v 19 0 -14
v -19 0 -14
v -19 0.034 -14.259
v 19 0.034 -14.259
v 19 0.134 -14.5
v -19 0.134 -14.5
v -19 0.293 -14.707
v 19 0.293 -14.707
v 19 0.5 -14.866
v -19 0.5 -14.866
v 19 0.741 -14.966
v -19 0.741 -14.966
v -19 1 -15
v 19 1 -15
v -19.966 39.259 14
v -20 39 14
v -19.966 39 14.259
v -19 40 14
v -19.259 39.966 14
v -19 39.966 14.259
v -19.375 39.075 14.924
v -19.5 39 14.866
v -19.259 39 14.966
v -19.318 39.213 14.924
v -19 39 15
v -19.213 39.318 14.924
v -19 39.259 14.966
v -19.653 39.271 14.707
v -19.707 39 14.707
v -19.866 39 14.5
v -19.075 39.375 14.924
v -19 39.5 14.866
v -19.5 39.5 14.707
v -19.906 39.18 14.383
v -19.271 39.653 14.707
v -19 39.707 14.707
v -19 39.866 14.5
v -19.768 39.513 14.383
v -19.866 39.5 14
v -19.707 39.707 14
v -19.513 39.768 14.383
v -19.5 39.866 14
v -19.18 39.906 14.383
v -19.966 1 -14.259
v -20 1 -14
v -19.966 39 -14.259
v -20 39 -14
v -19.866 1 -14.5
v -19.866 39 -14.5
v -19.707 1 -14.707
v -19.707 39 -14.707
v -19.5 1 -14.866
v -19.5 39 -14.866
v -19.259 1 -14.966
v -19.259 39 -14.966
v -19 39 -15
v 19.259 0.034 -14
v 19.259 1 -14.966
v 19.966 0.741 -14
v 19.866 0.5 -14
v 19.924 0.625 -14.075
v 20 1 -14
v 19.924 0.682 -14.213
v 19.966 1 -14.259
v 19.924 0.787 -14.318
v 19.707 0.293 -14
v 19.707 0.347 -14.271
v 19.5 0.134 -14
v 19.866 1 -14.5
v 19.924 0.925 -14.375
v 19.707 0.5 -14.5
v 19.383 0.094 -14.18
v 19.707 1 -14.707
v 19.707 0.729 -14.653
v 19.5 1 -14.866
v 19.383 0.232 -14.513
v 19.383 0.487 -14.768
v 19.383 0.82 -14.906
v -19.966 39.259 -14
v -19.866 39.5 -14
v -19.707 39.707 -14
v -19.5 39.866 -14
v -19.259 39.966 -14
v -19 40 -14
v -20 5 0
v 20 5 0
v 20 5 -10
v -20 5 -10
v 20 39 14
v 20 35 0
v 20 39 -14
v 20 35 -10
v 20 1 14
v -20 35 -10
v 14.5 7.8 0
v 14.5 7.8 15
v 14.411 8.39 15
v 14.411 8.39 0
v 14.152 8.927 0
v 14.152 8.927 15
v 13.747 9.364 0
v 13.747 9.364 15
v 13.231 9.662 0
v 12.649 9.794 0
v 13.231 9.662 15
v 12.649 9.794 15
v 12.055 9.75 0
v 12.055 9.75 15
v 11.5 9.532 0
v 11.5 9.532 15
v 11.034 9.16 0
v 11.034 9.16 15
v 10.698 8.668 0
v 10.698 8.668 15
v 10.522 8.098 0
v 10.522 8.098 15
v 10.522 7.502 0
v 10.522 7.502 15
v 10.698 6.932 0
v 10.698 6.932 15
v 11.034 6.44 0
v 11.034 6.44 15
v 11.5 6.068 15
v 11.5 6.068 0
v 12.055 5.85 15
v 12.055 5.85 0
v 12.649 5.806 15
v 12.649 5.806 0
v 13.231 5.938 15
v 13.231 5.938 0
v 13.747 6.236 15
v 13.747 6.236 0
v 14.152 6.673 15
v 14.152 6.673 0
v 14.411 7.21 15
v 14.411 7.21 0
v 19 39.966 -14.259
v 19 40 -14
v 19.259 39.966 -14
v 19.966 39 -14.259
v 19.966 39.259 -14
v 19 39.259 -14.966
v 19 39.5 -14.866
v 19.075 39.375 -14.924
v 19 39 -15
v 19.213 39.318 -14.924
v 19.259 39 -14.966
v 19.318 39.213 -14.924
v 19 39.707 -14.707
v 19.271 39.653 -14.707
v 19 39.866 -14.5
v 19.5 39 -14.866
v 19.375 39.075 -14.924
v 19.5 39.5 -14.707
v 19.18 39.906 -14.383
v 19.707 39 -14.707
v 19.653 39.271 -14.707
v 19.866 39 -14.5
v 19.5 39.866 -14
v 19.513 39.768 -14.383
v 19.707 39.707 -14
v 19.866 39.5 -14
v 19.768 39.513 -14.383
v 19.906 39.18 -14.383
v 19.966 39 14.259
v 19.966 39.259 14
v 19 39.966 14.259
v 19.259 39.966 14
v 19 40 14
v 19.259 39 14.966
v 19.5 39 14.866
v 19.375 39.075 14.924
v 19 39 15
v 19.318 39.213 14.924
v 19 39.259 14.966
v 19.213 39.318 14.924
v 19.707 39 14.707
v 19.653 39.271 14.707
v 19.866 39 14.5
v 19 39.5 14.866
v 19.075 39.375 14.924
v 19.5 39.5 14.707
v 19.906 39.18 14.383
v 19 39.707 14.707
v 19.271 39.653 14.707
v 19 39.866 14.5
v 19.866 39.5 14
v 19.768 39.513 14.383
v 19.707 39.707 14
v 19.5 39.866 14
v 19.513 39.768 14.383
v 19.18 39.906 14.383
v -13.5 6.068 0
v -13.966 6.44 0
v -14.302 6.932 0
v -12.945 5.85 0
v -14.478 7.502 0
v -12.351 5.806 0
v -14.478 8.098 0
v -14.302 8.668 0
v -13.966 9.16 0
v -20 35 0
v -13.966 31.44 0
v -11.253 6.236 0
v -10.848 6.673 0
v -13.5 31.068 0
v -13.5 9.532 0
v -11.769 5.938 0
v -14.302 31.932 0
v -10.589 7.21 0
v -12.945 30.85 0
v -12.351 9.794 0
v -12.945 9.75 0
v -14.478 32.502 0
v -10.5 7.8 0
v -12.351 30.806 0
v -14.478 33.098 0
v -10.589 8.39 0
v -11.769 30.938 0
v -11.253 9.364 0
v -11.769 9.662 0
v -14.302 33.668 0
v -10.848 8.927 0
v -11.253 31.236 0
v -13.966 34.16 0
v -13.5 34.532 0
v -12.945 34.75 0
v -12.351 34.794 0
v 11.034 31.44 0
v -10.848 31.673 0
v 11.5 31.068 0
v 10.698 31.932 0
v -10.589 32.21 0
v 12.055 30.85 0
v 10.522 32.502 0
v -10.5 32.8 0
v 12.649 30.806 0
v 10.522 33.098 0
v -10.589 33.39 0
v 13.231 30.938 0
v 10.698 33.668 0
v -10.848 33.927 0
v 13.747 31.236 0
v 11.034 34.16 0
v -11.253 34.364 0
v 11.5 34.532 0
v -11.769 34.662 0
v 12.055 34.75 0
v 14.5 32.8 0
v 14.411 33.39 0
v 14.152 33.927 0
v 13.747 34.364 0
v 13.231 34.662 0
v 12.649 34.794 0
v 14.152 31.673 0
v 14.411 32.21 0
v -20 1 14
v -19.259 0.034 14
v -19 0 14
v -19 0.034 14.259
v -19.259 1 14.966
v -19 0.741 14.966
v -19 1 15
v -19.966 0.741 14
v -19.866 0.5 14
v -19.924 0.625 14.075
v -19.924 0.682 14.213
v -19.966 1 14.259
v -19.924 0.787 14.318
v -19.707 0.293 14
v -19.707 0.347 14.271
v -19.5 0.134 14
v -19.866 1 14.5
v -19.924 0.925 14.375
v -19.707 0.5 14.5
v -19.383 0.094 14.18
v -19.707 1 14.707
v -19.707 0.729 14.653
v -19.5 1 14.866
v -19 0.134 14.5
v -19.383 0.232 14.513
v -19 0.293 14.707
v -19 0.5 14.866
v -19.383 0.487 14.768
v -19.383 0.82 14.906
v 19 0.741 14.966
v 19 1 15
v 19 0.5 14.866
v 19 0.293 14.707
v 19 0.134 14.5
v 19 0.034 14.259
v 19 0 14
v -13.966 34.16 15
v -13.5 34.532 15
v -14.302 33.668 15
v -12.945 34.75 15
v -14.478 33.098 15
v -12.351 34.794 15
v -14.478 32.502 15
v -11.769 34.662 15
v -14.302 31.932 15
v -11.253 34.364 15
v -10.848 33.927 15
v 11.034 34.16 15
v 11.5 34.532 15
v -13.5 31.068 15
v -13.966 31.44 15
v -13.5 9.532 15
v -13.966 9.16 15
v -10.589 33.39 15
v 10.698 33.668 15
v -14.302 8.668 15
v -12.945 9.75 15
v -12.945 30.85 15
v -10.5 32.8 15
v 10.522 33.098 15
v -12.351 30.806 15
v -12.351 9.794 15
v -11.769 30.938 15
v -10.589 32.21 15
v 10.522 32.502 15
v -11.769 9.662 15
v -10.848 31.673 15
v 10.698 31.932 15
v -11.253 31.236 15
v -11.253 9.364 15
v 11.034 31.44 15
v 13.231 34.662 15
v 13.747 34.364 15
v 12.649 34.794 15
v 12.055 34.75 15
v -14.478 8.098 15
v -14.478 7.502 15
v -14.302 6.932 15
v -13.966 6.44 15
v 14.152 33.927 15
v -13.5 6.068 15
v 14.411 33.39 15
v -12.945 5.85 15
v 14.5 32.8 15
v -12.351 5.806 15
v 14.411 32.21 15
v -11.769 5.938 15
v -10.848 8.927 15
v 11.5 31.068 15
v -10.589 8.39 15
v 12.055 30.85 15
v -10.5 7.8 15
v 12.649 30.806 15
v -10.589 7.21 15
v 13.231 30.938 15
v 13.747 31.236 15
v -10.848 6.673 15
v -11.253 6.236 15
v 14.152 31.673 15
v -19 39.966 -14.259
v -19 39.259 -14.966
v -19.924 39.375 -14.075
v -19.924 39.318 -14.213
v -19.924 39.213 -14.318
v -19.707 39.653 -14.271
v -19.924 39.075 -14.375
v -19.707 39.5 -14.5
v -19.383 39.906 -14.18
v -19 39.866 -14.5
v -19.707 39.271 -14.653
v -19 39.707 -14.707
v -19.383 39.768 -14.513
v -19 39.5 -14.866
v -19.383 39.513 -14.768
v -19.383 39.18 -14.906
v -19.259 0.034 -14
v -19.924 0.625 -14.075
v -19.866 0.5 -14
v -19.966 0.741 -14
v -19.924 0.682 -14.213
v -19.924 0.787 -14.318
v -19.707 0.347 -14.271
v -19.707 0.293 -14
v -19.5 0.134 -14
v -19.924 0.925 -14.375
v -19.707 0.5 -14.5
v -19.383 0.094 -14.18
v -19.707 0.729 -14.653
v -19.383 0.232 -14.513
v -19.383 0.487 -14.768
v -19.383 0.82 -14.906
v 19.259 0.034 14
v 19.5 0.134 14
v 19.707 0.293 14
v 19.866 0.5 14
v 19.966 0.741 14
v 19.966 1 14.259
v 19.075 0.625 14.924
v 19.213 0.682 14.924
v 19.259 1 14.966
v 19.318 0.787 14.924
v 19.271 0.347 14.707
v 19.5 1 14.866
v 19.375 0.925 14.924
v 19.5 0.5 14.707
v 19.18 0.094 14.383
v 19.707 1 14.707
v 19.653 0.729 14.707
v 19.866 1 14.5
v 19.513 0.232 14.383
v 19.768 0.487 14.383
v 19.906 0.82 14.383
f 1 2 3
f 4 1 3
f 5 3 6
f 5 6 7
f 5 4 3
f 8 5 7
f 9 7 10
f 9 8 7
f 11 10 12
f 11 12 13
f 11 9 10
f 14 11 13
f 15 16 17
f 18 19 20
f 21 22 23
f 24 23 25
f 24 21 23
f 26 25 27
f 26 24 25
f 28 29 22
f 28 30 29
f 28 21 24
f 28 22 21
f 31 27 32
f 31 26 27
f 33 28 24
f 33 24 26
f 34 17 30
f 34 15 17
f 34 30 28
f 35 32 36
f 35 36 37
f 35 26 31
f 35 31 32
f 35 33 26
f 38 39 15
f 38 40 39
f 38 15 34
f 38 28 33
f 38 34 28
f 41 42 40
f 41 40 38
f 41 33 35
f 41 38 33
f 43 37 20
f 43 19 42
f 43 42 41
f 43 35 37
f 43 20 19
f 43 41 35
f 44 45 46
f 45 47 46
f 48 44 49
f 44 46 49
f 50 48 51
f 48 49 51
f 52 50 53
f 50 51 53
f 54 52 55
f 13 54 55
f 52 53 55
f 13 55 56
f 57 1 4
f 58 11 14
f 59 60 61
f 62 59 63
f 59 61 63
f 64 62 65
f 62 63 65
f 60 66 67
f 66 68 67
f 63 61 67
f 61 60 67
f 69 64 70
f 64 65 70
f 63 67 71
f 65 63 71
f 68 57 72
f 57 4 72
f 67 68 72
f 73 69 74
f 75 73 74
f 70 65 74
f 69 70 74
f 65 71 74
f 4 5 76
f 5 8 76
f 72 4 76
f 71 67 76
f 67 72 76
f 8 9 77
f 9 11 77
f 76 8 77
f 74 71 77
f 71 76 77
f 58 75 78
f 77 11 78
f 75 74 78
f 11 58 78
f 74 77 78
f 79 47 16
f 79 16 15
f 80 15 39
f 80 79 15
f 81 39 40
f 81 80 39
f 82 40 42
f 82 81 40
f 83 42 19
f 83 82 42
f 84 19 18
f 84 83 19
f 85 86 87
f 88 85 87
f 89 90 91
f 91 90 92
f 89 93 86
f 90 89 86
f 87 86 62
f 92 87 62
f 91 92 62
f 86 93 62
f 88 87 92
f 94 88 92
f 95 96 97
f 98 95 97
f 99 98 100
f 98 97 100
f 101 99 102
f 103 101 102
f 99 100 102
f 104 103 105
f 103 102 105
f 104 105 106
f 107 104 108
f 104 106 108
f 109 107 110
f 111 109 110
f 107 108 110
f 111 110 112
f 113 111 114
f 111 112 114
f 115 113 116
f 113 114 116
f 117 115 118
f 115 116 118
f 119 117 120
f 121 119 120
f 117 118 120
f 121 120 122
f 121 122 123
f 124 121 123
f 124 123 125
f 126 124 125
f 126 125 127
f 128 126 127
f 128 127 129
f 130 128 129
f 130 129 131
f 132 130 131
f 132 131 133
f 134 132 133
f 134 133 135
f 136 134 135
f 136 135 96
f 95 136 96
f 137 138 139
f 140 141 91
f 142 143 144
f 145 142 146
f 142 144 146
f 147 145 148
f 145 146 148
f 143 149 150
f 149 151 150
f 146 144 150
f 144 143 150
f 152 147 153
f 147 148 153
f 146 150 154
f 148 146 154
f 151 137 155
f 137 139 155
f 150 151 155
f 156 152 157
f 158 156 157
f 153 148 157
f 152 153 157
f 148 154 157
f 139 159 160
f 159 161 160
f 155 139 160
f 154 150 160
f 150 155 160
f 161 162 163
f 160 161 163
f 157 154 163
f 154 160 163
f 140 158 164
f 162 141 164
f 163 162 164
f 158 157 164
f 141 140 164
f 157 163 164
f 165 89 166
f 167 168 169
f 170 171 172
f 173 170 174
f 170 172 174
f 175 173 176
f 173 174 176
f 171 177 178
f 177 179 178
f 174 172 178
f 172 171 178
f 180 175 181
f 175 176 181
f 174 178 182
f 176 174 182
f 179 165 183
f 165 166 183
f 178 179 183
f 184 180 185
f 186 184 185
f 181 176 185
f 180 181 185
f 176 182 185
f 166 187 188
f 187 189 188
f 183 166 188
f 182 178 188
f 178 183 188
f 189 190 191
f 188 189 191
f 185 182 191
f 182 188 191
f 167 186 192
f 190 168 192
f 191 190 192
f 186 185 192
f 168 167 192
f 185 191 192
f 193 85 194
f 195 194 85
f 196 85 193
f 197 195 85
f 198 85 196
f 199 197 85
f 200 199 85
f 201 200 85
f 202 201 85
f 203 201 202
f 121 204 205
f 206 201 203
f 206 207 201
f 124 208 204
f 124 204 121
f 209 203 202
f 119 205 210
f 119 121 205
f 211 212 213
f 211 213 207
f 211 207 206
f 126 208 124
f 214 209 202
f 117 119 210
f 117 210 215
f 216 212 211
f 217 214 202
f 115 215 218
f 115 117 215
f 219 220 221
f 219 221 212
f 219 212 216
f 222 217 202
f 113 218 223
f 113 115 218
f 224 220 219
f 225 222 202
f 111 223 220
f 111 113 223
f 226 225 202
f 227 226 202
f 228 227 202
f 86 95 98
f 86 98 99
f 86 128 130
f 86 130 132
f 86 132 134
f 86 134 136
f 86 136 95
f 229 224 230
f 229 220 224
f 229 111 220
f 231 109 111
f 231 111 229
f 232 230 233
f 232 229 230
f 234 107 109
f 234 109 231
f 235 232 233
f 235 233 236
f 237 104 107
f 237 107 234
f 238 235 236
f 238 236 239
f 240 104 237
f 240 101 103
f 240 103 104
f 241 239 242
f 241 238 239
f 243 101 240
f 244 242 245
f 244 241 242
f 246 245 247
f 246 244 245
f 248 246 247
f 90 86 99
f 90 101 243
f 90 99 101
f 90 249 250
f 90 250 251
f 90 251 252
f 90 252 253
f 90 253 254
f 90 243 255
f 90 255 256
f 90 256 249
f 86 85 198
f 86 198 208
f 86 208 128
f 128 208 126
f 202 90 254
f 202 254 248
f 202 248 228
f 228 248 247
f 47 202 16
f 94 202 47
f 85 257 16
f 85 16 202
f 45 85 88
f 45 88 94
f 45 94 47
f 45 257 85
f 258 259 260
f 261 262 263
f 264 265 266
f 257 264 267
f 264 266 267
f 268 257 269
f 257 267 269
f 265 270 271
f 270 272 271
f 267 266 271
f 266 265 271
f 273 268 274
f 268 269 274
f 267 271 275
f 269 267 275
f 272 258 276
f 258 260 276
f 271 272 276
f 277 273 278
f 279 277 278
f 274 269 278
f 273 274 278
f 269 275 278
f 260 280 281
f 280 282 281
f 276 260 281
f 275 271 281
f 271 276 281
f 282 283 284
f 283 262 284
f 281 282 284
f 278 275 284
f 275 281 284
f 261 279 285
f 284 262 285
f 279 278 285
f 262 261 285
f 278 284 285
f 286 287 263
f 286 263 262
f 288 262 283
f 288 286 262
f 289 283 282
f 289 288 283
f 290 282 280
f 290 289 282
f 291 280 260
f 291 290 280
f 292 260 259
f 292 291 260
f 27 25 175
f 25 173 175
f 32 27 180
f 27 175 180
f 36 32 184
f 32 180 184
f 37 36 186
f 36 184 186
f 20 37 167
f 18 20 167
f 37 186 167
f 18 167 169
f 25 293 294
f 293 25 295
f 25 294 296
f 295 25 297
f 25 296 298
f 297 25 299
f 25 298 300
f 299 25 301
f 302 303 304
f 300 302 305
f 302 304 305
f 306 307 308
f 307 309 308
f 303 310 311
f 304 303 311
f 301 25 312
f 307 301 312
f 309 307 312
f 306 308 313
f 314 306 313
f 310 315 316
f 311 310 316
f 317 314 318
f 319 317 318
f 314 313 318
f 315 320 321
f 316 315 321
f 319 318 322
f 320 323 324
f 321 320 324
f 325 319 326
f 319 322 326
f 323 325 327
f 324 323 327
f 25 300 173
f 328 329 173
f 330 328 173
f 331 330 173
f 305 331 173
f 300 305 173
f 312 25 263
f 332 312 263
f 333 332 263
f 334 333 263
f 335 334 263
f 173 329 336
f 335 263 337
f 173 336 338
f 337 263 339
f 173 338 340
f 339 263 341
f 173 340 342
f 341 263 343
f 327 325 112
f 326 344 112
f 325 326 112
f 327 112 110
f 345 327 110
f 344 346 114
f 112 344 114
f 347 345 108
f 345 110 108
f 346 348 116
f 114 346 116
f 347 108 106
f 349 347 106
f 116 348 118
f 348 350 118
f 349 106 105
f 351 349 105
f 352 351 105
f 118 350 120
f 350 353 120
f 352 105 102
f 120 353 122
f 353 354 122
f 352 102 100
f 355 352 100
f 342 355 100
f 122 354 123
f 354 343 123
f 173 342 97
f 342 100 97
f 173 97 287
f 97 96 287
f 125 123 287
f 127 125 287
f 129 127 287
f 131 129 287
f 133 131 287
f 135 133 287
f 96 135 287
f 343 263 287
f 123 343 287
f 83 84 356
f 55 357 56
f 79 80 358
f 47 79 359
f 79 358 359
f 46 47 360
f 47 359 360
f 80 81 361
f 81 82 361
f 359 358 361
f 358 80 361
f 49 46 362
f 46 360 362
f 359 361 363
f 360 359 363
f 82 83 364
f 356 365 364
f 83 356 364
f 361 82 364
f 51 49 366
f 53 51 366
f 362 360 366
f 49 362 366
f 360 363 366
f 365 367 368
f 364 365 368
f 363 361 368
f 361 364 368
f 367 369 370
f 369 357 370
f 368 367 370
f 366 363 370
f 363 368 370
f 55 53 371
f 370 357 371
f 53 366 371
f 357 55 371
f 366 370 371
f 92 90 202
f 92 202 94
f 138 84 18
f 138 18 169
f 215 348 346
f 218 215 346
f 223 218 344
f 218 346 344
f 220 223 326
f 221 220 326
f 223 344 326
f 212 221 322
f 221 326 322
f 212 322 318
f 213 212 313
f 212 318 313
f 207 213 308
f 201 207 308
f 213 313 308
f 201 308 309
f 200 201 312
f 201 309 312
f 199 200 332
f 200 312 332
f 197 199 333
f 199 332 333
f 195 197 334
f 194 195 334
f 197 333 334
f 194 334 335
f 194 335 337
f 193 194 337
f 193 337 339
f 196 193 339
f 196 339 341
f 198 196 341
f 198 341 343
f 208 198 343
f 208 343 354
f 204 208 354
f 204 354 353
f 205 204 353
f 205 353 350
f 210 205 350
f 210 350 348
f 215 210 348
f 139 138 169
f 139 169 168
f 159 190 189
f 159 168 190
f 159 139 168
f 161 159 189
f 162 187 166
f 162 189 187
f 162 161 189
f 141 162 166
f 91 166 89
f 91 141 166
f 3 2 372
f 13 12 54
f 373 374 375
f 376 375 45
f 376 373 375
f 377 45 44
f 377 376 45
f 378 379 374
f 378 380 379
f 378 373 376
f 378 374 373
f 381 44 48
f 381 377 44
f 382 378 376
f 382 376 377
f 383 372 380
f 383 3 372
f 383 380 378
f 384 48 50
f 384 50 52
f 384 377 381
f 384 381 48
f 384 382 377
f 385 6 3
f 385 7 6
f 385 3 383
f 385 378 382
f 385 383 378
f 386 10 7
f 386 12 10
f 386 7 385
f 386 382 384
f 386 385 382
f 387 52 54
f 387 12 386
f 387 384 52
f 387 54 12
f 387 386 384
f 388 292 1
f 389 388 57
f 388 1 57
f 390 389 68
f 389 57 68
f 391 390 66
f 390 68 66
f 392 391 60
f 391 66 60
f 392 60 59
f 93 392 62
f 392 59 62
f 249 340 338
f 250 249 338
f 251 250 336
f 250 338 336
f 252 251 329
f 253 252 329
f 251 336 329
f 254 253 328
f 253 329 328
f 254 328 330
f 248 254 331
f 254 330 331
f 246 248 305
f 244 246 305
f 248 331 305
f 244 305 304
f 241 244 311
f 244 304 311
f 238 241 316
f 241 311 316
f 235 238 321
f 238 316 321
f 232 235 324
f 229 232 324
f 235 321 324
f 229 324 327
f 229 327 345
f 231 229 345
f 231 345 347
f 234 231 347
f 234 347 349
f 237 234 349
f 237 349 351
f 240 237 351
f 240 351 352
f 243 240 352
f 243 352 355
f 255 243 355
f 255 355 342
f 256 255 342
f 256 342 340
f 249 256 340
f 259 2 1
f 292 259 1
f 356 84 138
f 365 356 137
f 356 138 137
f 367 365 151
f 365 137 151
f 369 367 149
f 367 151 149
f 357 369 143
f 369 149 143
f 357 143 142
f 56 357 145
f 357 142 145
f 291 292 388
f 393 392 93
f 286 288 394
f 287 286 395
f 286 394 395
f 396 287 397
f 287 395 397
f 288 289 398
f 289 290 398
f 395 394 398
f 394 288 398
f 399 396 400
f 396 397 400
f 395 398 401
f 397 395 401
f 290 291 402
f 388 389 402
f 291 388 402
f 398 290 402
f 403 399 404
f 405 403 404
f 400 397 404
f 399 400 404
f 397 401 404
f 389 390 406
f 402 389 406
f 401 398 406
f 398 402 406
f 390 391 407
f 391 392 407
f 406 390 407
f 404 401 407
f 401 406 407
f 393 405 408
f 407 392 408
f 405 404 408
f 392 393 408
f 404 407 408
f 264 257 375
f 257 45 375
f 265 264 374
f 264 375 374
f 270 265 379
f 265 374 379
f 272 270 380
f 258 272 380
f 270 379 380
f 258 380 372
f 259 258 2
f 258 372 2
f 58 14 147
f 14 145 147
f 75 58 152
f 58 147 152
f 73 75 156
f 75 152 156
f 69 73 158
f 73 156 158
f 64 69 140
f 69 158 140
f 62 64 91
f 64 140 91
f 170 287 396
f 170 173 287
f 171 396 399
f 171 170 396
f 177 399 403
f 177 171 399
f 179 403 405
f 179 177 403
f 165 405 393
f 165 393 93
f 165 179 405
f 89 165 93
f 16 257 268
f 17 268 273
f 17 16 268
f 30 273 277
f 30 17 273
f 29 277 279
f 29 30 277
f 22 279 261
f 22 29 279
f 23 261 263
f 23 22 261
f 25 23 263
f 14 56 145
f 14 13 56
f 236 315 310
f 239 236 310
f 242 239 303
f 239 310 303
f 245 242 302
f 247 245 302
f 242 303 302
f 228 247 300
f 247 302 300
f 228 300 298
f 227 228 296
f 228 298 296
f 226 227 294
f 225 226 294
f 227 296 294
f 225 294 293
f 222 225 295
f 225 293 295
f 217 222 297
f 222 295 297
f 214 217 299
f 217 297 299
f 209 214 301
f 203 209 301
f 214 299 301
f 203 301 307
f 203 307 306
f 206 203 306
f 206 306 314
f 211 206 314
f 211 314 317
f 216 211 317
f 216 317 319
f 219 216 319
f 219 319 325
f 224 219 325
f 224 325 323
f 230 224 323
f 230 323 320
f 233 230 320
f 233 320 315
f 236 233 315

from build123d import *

# Parameters (mm, degrees)
SKETCH2_W           = 40
SKETCH2_H           = 30
BOSS_EXTRUDE1_DEPTH = 40
SKETCH3_W           = 10
SKETCH3_H           = 30
CUT_EXTRUDE1_DEPTH  = 40
CUT_EXTRUDE2_REACH  = 55.852
SKETCH5_R           = 2
FILLET2_R           = 1


with BuildPart() as part:
    # Sketch2 → Boss-Extrude1 (new body)
    with BuildSketch(Plane(origin=(0, 0, 0), x_dir=(1, 0, 0), z_dir=(0, 1, 0))):
        Rectangle(SKETCH2_W, SKETCH2_H)
    extrude(amount=BOSS_EXTRUDE1_DEPTH)

    # Sketch3 → Cut-Extrude1 (cut)
    with BuildSketch(Plane(origin=(20, 0, 0), x_dir=(0, 0, -1), z_dir=(1, 0, 0))):
        with Locations((5, 20)):
            Rectangle(SKETCH3_W, SKETCH3_H)
    extrude(amount=-CUT_EXTRUDE1_DEPTH, mode=Mode.SUBTRACT)

    # Sketch5 → Cut-Extrude2 (cut, up to next)
    with BuildSketch(Plane.XY.offset(15), mode=Mode.PRIVATE) as cut_extrude2_sk1:
        with Locations((12.5, 7.8)):
            Circle(SKETCH5_R)
    cut_extrude2_tool1 = extrude(cut_extrude2_sk1.sketch, amount=-CUT_EXTRUDE2_REACH, mode=Mode.PRIVATE) & part.part
    # Sketch5 → Cut-Extrude2 (cut, up to next)
    with BuildSketch(Plane.XY.offset(15), mode=Mode.PRIVATE) as cut_extrude2_sk2:
        with Locations((12.5, 32.8)):
            Circle(SKETCH5_R)
    cut_extrude2_tool2 = extrude(cut_extrude2_sk2.sketch, amount=-CUT_EXTRUDE2_REACH, mode=Mode.PRIVATE) & part.part
    # Sketch5 → Cut-Extrude2 (cut, up to next)
    with BuildSketch(Plane.XY.offset(15), mode=Mode.PRIVATE) as cut_extrude2_sk3:
        with Locations((-12.5, 32.8)):
            Circle(SKETCH5_R)
    cut_extrude2_tool3 = extrude(cut_extrude2_sk3.sketch, amount=-CUT_EXTRUDE2_REACH, mode=Mode.PRIVATE) & part.part
    # Sketch5 → Cut-Extrude2 (cut, up to next)
    with BuildSketch(Plane.XY.offset(15), mode=Mode.PRIVATE) as cut_extrude2_sk4:
        with Locations((-12.5, 7.8)):
            Circle(SKETCH5_R)
    cut_extrude2_tool4 = extrude(cut_extrude2_sk4.sketch, amount=-CUT_EXTRUDE2_REACH, mode=Mode.PRIVATE) & part.part
    add(cut_extrude2_tool1.solids().sort_by_distance((12.5, 7.8, 15))[0], mode=Mode.SUBTRACT)
    add(cut_extrude2_tool2.solids().sort_by_distance((12.5, 32.8, 15))[0], mode=Mode.SUBTRACT)
    add(cut_extrude2_tool3.solids().sort_by_distance((-12.5, 32.8, 15))[0], mode=Mode.SUBTRACT)
    add(cut_extrude2_tool4.solids().sort_by_distance((-12.5, 7.8, 15))[0], mode=Mode.SUBTRACT)

    # Fillet2
    fillet2_edges = [part.edges().sort_by_distance(p)[0] for p in [
        (20, 40, 0),
        (0, 40, -15),
        (-20, 40, 0),
        (0, 0, -15),
        (20, 0, 0),
        (0, 0, 15),
        (-20, 0, 0),
        (-20, 20, -15),
        (20, 20, -15),
        (20, 20, 15),
        (-20, 20, 15),
        (0, 40, 15),
    ]]
    fillet(fillet2_edges, radius=FILLET2_R)


solid = part.part
